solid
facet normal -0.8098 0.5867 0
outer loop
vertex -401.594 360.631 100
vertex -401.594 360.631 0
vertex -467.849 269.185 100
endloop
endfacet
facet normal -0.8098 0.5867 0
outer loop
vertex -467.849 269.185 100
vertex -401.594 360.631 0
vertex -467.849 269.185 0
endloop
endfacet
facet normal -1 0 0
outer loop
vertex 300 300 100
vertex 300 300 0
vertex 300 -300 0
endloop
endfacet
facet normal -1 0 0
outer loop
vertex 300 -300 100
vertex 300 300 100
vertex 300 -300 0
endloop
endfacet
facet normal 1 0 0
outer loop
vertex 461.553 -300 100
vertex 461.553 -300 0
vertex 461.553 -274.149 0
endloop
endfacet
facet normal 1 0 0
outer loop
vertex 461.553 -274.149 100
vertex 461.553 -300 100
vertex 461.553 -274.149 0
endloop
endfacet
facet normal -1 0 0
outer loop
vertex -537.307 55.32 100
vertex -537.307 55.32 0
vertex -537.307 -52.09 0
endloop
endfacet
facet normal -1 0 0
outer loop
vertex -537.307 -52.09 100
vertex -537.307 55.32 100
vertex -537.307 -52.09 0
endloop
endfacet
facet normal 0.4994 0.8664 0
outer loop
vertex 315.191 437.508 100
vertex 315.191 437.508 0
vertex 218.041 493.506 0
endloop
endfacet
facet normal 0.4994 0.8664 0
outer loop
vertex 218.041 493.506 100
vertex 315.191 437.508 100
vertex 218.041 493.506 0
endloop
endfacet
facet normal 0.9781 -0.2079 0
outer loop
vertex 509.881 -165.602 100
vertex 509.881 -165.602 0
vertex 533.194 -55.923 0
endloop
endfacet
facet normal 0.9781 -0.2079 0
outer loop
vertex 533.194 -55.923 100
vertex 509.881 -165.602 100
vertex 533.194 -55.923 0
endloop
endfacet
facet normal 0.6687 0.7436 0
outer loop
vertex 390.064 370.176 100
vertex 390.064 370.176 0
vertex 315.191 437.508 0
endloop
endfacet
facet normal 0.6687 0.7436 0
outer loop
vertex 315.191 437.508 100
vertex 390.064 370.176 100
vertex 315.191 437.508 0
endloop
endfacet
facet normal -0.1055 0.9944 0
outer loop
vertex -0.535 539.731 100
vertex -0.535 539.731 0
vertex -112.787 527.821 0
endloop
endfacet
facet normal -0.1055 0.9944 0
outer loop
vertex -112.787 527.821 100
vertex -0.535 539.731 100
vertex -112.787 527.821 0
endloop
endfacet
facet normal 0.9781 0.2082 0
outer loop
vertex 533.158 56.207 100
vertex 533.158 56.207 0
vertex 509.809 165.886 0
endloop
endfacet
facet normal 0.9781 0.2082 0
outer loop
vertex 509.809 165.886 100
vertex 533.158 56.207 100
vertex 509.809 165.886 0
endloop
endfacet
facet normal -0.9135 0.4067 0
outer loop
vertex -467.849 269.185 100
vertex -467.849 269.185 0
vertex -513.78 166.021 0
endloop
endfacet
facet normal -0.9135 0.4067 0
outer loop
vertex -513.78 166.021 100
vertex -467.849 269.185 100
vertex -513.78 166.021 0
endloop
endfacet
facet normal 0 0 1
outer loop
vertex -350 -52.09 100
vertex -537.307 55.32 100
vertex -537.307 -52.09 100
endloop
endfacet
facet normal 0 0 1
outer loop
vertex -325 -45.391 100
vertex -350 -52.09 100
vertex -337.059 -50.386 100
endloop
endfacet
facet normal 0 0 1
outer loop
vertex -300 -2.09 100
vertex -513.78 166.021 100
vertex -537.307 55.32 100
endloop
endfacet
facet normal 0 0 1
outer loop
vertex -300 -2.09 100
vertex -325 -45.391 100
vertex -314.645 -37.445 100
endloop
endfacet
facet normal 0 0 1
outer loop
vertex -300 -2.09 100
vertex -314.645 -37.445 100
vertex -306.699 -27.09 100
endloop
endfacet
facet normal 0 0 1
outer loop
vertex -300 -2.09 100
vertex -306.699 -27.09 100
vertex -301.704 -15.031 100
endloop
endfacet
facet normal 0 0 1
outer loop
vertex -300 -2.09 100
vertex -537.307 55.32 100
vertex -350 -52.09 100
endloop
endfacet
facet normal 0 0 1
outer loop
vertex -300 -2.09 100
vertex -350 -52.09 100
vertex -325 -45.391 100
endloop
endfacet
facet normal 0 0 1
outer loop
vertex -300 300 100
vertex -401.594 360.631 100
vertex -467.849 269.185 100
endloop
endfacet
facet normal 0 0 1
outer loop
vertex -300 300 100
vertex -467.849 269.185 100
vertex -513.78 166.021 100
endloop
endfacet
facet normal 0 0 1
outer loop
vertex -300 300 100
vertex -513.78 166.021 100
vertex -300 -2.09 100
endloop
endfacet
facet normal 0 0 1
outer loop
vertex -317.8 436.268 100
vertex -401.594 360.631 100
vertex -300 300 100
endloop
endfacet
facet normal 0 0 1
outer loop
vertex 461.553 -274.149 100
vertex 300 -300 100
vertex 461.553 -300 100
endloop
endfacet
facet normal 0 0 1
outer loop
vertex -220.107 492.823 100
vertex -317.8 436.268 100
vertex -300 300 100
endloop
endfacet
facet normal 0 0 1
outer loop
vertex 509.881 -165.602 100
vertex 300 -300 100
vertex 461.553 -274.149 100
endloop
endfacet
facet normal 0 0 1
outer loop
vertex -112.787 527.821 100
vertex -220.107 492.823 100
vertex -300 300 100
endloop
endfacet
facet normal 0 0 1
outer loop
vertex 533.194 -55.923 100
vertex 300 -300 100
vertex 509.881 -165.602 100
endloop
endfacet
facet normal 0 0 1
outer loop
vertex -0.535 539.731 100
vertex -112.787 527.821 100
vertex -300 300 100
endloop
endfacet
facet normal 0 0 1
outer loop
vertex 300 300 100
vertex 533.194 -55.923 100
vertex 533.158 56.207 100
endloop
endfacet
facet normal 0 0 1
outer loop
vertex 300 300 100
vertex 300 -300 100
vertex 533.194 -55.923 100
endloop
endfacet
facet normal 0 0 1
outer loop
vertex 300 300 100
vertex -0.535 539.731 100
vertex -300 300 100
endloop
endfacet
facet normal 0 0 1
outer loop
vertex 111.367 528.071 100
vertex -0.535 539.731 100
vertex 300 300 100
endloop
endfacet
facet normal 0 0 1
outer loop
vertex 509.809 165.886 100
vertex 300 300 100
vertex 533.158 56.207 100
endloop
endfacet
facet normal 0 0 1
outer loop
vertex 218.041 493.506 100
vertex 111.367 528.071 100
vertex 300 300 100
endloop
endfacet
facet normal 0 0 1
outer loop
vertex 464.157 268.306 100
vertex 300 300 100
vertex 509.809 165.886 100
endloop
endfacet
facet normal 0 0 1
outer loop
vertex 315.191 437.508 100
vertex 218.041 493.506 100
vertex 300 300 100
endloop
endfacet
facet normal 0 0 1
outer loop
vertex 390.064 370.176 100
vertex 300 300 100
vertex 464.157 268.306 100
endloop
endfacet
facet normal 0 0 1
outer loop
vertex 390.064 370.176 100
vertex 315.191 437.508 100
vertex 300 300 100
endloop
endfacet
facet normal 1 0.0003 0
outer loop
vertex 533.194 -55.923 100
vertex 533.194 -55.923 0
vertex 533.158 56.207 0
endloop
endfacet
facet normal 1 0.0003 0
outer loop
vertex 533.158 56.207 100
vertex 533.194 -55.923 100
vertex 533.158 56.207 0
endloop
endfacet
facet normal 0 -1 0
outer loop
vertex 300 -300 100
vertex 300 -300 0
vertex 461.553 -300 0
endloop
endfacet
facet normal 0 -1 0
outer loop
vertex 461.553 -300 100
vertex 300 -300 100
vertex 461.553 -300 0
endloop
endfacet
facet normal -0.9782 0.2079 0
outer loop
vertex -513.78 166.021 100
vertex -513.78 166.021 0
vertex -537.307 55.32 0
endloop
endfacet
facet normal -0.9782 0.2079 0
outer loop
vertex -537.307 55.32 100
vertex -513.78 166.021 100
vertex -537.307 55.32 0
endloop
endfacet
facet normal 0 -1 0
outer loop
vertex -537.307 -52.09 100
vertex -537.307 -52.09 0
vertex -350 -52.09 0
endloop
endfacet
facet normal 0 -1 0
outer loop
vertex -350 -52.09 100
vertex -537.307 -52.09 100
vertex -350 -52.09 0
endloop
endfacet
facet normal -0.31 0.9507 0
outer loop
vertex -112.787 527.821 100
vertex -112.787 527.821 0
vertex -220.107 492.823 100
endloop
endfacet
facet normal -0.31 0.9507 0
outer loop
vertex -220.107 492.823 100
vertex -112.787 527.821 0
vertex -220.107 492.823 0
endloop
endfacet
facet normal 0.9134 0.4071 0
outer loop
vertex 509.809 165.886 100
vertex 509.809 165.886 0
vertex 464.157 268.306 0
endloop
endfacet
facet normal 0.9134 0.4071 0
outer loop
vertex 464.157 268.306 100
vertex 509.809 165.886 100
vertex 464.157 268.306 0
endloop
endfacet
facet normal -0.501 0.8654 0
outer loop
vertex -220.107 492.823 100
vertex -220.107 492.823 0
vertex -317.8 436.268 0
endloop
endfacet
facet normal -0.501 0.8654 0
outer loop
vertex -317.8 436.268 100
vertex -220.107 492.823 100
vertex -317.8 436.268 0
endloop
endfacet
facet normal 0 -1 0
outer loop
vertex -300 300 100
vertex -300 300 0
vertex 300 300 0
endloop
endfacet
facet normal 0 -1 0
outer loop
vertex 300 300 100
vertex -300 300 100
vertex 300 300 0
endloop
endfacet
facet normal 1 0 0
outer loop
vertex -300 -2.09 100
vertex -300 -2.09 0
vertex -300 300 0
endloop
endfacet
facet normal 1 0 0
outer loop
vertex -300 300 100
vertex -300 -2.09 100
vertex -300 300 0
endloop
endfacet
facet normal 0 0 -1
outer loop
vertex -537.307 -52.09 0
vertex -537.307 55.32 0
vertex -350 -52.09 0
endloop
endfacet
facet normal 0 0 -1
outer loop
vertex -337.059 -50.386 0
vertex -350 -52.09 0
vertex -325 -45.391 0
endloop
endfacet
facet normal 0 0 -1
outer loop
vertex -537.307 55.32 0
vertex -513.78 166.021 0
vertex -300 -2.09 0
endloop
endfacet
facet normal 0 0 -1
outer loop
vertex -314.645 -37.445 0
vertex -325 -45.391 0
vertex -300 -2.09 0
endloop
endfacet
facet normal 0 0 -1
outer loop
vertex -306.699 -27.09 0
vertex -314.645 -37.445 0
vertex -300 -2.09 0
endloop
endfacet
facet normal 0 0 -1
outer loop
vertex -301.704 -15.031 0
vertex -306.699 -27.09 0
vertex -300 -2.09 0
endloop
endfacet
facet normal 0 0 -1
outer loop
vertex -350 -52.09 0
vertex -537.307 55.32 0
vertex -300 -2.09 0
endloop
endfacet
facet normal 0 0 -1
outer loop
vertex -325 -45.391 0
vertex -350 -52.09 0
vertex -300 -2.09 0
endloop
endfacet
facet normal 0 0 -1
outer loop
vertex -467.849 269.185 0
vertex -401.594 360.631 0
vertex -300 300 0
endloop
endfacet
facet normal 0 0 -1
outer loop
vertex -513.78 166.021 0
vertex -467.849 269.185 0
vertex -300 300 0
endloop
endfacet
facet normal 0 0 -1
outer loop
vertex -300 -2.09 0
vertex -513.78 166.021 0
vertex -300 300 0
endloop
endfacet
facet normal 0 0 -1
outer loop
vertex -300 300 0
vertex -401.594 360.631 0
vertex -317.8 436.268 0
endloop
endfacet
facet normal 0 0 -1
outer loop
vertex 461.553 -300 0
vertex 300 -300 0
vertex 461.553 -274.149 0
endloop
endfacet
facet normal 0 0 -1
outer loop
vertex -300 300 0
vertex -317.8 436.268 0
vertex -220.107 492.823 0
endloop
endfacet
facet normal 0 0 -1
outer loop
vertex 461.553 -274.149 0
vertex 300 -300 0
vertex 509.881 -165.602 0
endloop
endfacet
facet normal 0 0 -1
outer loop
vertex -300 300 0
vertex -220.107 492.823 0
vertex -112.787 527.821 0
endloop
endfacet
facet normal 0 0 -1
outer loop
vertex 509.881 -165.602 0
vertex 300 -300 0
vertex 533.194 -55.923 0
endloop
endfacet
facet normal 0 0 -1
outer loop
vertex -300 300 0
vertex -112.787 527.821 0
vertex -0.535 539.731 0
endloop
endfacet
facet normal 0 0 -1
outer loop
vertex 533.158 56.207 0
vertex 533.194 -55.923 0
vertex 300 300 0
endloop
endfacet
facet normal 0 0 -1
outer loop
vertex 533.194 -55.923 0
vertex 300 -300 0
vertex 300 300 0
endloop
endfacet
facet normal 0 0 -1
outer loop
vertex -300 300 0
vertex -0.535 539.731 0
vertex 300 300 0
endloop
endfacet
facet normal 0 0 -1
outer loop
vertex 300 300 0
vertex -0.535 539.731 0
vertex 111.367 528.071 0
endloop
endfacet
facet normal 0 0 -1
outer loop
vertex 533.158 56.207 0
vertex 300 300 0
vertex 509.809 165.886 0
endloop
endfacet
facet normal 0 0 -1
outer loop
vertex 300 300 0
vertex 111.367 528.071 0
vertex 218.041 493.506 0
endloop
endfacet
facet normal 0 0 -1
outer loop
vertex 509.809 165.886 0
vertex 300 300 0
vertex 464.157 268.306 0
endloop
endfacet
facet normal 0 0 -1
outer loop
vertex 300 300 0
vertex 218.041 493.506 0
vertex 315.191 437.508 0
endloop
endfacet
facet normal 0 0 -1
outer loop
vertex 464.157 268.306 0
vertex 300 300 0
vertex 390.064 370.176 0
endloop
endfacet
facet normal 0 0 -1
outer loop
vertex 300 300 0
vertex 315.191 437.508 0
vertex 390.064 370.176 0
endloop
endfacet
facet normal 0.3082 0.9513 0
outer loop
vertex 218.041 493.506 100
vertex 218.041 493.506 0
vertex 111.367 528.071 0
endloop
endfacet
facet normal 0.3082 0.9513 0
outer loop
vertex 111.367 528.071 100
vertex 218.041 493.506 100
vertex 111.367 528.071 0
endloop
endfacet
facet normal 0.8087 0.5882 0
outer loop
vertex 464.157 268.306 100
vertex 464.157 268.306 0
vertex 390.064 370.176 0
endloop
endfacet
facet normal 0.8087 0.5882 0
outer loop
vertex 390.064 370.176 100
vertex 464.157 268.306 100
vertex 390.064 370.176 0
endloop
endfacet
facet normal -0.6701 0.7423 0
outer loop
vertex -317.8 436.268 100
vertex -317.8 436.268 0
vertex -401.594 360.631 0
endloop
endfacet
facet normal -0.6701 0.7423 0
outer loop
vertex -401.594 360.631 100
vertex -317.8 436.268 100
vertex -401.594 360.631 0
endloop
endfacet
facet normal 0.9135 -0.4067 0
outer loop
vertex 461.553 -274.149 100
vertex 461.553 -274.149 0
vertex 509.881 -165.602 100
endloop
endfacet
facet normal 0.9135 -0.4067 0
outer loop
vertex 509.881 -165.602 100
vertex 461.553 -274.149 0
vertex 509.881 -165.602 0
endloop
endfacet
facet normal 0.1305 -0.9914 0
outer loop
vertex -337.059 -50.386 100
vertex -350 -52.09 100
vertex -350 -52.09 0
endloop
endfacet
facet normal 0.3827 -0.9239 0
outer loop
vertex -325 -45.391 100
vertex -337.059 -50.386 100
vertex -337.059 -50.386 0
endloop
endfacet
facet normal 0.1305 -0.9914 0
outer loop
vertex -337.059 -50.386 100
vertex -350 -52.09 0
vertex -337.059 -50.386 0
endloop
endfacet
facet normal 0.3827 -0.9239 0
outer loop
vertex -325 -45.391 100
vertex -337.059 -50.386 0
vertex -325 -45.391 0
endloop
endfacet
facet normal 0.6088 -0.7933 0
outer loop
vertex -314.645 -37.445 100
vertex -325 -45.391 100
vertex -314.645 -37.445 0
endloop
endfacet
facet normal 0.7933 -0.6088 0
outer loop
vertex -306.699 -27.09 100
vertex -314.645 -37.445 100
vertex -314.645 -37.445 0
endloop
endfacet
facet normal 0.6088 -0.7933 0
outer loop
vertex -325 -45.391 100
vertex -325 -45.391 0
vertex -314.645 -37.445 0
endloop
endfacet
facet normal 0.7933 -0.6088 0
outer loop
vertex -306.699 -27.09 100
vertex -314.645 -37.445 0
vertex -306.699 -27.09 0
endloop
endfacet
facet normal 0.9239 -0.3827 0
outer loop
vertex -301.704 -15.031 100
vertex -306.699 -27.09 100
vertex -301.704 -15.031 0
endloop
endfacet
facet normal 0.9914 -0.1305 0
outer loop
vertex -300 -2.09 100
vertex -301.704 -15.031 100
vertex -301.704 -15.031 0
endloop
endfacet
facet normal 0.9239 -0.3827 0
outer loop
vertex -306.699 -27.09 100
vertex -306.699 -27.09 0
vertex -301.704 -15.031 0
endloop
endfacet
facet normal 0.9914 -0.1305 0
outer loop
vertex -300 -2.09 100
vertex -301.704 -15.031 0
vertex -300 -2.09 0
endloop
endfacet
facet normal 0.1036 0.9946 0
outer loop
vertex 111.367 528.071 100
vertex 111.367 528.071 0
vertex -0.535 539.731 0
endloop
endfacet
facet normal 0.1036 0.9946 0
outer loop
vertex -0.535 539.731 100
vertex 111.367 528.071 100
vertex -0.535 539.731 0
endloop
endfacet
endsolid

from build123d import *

# Parameters (mm, degrees)
F1_DEPTH = 100


with BuildPart() as f1:
    # F0 (on Top) → F1 (new body)
    with BuildSketch(Plane.XY):
        with BuildLine():
            Line((-300, 300), (-250, 300))
            Line((-250, 300), (250, 300))
            Line((250, 300), (300, 300))
            Line((300, 300), (300, 250))
            Line((300, 250), (300, -300))
            Line((300, -300), (461.55284, -300))
            Line((461.55284, -300), (461.55284, -274.148953))
            Line((461.55284, -274.148953), (509.881234, -165.601602))
            Line((509.881234, -165.601602), (533.194239, -55.922539))
            Line((533.194239, -55.922539), (533.158025, 56.207051))
            Line((533.158025, 56.207051), (509.808885, 165.885914))
            Line((509.808885, 165.885914), (464.157372, 268.30564))
            Line((464.157372, 268.30564), (390.063715, 370.175778))
            Line((390.063715, 370.175778), (315.191048, 437.507966))
            Line((315.191048, 437.507966), (218.040579, 493.50566))
            Line((218.040579, 493.50566), (111.367142, 528.071001))
            Line((111.367142, 528.071001), (-0.534983, 539.73091))
            Line((-0.534983, 539.73091), (-112.787019, 527.820755))
            Line((-112.787019, 527.820755), (-220.106861, 492.822908))
            Line((-220.106861, 492.822908), (-317.800291, 436.268358))
            Line((-317.800291, 436.268358), (-401.594268, 360.630946))
            Line((-401.594268, 360.630946), (-467.848829, 269.184572))
            Line((-467.848829, 269.184572), (-513.780329, 166.020735))
            Line((-513.780329, 166.020735), (-537.307359, 55.319745))
            Line((-537.307359, 55.319745), (-537.307359, -52.090053))
            Line((-537.307359, -52.090053), (-350, -52.090053))
            ThreePointArc((-350, -52.090053), (-314.644661, -37.445392), (-300, -2.090053))
            Line((-300, -2.090053), (-300, 250))
            Line((-300, 250), (-300, 300))
        make_face()
    extrude(amount=F1_DEPTH)


solid = f1.part
